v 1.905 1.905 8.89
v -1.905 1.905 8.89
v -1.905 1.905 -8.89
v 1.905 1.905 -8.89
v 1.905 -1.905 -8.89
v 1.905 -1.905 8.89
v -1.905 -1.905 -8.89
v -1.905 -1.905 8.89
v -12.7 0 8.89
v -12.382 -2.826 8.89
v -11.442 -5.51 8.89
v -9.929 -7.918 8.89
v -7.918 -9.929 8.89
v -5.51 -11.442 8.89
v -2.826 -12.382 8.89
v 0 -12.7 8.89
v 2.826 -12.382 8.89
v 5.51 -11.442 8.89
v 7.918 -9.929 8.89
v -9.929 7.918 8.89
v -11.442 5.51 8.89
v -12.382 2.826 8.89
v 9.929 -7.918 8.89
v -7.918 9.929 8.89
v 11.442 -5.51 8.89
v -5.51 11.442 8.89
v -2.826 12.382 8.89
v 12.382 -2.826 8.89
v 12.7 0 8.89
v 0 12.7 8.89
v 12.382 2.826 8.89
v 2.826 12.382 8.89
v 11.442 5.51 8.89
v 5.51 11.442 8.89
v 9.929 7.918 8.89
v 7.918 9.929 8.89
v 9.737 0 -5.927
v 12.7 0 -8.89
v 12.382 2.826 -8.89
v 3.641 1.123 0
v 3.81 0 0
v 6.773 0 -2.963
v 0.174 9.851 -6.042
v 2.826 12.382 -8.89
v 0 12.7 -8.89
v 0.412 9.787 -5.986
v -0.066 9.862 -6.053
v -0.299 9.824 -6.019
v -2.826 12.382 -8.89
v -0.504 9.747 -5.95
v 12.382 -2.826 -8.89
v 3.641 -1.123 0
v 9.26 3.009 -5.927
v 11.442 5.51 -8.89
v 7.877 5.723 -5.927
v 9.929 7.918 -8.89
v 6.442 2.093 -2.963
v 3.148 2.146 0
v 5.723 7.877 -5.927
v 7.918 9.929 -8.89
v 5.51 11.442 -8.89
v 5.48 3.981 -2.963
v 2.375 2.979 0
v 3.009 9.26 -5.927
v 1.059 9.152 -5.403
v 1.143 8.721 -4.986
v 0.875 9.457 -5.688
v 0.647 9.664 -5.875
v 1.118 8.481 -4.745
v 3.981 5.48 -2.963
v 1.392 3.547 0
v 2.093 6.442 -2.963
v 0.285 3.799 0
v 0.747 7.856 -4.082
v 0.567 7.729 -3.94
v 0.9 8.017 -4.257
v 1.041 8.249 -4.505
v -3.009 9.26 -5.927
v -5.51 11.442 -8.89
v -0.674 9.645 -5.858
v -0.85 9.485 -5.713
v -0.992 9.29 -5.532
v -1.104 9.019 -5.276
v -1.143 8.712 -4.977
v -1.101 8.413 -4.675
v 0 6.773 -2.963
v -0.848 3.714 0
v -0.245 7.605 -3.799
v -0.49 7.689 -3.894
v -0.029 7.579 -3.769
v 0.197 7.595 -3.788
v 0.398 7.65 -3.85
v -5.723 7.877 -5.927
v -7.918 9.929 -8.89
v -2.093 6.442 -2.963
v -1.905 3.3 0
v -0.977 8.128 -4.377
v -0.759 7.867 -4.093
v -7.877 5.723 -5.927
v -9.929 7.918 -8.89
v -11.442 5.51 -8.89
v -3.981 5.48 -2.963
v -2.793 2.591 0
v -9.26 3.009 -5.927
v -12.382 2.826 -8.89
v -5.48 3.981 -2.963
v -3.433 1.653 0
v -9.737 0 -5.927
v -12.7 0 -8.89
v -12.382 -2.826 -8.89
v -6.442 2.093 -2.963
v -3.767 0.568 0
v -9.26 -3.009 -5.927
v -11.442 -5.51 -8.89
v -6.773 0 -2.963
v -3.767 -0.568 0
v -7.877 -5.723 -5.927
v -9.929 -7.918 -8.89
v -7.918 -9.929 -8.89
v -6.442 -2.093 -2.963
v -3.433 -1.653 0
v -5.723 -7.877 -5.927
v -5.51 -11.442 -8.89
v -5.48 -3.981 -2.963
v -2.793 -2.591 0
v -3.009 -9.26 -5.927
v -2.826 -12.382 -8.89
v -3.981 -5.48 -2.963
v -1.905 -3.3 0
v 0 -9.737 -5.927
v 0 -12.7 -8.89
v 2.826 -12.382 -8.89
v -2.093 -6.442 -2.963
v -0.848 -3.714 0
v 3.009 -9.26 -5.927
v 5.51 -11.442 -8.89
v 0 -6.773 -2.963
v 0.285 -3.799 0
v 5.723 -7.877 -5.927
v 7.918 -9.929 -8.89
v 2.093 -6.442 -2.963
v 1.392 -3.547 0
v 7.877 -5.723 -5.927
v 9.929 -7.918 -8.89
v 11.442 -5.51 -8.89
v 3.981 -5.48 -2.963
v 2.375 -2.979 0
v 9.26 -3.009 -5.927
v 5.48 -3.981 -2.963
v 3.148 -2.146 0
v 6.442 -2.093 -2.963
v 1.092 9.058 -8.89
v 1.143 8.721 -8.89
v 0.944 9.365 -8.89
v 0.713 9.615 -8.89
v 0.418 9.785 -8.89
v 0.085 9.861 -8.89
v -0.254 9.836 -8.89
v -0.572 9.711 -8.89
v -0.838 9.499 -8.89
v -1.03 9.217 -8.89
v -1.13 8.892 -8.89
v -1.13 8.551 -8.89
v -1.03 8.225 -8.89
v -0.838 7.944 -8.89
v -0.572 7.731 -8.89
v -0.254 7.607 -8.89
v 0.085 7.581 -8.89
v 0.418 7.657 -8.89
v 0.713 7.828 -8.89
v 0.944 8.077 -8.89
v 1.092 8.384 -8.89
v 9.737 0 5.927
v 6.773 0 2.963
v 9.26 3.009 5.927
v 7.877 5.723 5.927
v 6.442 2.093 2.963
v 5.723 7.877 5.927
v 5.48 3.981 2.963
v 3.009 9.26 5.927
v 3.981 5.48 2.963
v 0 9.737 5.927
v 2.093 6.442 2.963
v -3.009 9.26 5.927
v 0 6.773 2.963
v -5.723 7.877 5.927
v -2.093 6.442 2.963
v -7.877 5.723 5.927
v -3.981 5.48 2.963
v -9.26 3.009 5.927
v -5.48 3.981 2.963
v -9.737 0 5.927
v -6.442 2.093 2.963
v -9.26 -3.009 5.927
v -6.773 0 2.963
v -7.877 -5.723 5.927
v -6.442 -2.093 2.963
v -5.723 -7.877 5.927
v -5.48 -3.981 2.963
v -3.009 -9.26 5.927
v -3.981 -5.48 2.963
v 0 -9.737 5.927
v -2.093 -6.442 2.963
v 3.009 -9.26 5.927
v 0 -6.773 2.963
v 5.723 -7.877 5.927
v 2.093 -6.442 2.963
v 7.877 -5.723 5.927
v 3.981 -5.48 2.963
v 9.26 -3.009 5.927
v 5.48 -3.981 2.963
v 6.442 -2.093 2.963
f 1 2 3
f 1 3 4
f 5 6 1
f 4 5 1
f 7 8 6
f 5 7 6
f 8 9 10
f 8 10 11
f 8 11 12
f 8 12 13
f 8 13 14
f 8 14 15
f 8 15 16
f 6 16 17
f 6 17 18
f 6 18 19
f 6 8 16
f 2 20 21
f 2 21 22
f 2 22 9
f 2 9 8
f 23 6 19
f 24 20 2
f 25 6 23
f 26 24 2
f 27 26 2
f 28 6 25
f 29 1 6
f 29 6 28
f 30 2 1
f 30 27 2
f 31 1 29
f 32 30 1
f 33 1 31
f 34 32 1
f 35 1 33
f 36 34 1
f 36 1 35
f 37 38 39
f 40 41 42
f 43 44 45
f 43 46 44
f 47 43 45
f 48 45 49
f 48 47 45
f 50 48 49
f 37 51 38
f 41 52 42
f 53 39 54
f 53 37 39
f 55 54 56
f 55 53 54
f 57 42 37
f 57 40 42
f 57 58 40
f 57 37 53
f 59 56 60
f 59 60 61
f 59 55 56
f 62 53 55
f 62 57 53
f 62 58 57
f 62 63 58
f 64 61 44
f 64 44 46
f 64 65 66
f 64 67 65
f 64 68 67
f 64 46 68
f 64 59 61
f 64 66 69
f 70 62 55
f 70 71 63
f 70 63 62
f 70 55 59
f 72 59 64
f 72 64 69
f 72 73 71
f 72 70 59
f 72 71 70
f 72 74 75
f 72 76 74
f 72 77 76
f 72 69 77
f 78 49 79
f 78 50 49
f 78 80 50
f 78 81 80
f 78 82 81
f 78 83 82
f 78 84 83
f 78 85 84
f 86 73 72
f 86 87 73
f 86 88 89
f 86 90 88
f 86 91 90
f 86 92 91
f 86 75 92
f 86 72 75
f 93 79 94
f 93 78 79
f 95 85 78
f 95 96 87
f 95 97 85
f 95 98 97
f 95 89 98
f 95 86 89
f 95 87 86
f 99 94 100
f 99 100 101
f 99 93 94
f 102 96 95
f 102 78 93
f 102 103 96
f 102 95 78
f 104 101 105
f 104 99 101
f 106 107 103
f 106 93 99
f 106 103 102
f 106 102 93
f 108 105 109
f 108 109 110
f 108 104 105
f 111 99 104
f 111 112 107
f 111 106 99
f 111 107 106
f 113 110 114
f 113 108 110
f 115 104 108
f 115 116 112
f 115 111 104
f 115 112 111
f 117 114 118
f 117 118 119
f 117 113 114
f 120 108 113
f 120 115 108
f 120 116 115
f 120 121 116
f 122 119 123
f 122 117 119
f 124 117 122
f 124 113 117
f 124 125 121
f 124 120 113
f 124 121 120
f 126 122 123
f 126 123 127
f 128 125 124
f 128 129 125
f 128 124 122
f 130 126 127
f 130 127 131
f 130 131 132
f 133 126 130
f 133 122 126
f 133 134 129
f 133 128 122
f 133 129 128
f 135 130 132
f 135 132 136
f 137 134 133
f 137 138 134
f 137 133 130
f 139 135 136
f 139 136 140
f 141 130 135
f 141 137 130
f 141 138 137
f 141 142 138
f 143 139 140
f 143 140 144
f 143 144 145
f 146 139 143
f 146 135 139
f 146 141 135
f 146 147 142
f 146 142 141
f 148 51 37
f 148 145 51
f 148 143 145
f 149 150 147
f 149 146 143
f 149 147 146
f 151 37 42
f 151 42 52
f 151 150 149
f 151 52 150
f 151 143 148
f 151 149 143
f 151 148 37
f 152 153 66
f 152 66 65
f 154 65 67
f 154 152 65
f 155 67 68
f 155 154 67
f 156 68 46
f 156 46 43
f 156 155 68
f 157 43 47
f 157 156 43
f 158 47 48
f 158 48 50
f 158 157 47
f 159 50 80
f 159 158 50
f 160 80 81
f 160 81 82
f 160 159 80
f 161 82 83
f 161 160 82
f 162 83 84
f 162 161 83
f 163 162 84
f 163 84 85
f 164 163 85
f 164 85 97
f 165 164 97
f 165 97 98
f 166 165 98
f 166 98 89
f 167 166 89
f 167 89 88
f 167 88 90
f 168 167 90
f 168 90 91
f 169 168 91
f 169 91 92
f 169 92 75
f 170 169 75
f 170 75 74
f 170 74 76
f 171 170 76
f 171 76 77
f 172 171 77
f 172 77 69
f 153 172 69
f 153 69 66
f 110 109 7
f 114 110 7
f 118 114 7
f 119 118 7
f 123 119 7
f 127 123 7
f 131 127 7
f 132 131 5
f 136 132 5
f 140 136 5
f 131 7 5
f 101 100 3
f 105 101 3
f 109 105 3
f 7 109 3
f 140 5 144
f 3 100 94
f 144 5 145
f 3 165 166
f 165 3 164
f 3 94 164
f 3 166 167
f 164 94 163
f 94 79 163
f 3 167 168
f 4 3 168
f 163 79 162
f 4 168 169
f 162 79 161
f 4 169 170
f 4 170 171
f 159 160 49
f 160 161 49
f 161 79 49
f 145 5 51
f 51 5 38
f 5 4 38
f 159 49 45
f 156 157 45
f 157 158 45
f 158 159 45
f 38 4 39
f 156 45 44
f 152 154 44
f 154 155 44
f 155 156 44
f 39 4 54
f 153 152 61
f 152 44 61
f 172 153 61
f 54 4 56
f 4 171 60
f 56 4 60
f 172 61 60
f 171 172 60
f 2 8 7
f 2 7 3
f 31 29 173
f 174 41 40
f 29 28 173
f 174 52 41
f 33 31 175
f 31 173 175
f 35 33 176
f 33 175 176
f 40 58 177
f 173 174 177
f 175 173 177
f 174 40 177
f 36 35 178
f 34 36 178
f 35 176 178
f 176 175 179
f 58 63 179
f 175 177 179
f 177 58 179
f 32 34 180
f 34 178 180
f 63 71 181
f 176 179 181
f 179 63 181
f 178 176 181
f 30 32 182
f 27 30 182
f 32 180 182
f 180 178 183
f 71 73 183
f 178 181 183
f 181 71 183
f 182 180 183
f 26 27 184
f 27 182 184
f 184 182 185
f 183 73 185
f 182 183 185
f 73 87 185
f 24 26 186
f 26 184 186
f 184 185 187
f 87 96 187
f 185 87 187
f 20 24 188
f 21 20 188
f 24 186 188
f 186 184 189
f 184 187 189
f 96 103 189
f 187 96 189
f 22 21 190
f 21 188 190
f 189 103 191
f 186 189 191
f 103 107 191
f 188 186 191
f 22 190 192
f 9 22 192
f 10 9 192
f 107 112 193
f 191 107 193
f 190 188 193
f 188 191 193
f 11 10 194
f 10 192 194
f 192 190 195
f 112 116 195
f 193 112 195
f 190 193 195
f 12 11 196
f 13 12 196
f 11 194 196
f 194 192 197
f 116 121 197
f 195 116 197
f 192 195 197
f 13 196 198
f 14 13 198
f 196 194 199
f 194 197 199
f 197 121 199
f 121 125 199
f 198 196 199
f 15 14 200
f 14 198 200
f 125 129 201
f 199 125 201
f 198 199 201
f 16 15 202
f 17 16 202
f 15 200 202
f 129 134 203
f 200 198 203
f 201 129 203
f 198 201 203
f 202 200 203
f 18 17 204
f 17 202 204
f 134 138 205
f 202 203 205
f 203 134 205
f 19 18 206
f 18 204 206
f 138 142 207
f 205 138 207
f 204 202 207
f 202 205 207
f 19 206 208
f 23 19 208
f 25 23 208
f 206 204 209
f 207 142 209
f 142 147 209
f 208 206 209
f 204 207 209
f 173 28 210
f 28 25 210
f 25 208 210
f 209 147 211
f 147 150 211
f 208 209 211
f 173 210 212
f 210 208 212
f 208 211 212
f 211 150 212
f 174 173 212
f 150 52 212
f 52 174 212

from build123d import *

# Parameters (mm, degrees)
F3_R      = 12.7
F4_R      = 3.81
F2_R      = 12.7
F7_W      = 3.81
F7_H      = 3.81
F8_DEPTH  = 25.4
F9_R      = 1.143
F10_DEPTH = 6.858


with BuildPart() as f5:
    # F3 (on offset) → F5 section 0
    with BuildSketch(Plane.XY.offset(-8.89)):
        Circle(F3_R)
    # F4 (on Top) → F5 section 1
    with BuildSketch(Plane.XY):
        Circle(F4_R)
    loft()

    # F2 (on offset) → F6 section 0
    with BuildSketch(Plane.XY.offset(8.89)):
        Circle(F2_R)
    # F4 (on Top) → F6 section 1
    with BuildSketch(Plane.XY):
        Circle(F4_R)
    loft()

    # F7 (on offset) → F8 (cut)
    with BuildSketch(Plane.XY.offset(8.89)):
        Rectangle(F7_W, F7_H)
    extrude(amount=-F8_DEPTH, mode=Mode.SUBTRACT)

    # F9 (on offset) → F10 (cut)
    with BuildSketch(Plane.XY.offset(-8.89)):
        with Locations((0, 8.72125)):
            Circle(F9_R)
    extrude(amount=F10_DEPTH, mode=Mode.SUBTRACT)


solid = f5.part
